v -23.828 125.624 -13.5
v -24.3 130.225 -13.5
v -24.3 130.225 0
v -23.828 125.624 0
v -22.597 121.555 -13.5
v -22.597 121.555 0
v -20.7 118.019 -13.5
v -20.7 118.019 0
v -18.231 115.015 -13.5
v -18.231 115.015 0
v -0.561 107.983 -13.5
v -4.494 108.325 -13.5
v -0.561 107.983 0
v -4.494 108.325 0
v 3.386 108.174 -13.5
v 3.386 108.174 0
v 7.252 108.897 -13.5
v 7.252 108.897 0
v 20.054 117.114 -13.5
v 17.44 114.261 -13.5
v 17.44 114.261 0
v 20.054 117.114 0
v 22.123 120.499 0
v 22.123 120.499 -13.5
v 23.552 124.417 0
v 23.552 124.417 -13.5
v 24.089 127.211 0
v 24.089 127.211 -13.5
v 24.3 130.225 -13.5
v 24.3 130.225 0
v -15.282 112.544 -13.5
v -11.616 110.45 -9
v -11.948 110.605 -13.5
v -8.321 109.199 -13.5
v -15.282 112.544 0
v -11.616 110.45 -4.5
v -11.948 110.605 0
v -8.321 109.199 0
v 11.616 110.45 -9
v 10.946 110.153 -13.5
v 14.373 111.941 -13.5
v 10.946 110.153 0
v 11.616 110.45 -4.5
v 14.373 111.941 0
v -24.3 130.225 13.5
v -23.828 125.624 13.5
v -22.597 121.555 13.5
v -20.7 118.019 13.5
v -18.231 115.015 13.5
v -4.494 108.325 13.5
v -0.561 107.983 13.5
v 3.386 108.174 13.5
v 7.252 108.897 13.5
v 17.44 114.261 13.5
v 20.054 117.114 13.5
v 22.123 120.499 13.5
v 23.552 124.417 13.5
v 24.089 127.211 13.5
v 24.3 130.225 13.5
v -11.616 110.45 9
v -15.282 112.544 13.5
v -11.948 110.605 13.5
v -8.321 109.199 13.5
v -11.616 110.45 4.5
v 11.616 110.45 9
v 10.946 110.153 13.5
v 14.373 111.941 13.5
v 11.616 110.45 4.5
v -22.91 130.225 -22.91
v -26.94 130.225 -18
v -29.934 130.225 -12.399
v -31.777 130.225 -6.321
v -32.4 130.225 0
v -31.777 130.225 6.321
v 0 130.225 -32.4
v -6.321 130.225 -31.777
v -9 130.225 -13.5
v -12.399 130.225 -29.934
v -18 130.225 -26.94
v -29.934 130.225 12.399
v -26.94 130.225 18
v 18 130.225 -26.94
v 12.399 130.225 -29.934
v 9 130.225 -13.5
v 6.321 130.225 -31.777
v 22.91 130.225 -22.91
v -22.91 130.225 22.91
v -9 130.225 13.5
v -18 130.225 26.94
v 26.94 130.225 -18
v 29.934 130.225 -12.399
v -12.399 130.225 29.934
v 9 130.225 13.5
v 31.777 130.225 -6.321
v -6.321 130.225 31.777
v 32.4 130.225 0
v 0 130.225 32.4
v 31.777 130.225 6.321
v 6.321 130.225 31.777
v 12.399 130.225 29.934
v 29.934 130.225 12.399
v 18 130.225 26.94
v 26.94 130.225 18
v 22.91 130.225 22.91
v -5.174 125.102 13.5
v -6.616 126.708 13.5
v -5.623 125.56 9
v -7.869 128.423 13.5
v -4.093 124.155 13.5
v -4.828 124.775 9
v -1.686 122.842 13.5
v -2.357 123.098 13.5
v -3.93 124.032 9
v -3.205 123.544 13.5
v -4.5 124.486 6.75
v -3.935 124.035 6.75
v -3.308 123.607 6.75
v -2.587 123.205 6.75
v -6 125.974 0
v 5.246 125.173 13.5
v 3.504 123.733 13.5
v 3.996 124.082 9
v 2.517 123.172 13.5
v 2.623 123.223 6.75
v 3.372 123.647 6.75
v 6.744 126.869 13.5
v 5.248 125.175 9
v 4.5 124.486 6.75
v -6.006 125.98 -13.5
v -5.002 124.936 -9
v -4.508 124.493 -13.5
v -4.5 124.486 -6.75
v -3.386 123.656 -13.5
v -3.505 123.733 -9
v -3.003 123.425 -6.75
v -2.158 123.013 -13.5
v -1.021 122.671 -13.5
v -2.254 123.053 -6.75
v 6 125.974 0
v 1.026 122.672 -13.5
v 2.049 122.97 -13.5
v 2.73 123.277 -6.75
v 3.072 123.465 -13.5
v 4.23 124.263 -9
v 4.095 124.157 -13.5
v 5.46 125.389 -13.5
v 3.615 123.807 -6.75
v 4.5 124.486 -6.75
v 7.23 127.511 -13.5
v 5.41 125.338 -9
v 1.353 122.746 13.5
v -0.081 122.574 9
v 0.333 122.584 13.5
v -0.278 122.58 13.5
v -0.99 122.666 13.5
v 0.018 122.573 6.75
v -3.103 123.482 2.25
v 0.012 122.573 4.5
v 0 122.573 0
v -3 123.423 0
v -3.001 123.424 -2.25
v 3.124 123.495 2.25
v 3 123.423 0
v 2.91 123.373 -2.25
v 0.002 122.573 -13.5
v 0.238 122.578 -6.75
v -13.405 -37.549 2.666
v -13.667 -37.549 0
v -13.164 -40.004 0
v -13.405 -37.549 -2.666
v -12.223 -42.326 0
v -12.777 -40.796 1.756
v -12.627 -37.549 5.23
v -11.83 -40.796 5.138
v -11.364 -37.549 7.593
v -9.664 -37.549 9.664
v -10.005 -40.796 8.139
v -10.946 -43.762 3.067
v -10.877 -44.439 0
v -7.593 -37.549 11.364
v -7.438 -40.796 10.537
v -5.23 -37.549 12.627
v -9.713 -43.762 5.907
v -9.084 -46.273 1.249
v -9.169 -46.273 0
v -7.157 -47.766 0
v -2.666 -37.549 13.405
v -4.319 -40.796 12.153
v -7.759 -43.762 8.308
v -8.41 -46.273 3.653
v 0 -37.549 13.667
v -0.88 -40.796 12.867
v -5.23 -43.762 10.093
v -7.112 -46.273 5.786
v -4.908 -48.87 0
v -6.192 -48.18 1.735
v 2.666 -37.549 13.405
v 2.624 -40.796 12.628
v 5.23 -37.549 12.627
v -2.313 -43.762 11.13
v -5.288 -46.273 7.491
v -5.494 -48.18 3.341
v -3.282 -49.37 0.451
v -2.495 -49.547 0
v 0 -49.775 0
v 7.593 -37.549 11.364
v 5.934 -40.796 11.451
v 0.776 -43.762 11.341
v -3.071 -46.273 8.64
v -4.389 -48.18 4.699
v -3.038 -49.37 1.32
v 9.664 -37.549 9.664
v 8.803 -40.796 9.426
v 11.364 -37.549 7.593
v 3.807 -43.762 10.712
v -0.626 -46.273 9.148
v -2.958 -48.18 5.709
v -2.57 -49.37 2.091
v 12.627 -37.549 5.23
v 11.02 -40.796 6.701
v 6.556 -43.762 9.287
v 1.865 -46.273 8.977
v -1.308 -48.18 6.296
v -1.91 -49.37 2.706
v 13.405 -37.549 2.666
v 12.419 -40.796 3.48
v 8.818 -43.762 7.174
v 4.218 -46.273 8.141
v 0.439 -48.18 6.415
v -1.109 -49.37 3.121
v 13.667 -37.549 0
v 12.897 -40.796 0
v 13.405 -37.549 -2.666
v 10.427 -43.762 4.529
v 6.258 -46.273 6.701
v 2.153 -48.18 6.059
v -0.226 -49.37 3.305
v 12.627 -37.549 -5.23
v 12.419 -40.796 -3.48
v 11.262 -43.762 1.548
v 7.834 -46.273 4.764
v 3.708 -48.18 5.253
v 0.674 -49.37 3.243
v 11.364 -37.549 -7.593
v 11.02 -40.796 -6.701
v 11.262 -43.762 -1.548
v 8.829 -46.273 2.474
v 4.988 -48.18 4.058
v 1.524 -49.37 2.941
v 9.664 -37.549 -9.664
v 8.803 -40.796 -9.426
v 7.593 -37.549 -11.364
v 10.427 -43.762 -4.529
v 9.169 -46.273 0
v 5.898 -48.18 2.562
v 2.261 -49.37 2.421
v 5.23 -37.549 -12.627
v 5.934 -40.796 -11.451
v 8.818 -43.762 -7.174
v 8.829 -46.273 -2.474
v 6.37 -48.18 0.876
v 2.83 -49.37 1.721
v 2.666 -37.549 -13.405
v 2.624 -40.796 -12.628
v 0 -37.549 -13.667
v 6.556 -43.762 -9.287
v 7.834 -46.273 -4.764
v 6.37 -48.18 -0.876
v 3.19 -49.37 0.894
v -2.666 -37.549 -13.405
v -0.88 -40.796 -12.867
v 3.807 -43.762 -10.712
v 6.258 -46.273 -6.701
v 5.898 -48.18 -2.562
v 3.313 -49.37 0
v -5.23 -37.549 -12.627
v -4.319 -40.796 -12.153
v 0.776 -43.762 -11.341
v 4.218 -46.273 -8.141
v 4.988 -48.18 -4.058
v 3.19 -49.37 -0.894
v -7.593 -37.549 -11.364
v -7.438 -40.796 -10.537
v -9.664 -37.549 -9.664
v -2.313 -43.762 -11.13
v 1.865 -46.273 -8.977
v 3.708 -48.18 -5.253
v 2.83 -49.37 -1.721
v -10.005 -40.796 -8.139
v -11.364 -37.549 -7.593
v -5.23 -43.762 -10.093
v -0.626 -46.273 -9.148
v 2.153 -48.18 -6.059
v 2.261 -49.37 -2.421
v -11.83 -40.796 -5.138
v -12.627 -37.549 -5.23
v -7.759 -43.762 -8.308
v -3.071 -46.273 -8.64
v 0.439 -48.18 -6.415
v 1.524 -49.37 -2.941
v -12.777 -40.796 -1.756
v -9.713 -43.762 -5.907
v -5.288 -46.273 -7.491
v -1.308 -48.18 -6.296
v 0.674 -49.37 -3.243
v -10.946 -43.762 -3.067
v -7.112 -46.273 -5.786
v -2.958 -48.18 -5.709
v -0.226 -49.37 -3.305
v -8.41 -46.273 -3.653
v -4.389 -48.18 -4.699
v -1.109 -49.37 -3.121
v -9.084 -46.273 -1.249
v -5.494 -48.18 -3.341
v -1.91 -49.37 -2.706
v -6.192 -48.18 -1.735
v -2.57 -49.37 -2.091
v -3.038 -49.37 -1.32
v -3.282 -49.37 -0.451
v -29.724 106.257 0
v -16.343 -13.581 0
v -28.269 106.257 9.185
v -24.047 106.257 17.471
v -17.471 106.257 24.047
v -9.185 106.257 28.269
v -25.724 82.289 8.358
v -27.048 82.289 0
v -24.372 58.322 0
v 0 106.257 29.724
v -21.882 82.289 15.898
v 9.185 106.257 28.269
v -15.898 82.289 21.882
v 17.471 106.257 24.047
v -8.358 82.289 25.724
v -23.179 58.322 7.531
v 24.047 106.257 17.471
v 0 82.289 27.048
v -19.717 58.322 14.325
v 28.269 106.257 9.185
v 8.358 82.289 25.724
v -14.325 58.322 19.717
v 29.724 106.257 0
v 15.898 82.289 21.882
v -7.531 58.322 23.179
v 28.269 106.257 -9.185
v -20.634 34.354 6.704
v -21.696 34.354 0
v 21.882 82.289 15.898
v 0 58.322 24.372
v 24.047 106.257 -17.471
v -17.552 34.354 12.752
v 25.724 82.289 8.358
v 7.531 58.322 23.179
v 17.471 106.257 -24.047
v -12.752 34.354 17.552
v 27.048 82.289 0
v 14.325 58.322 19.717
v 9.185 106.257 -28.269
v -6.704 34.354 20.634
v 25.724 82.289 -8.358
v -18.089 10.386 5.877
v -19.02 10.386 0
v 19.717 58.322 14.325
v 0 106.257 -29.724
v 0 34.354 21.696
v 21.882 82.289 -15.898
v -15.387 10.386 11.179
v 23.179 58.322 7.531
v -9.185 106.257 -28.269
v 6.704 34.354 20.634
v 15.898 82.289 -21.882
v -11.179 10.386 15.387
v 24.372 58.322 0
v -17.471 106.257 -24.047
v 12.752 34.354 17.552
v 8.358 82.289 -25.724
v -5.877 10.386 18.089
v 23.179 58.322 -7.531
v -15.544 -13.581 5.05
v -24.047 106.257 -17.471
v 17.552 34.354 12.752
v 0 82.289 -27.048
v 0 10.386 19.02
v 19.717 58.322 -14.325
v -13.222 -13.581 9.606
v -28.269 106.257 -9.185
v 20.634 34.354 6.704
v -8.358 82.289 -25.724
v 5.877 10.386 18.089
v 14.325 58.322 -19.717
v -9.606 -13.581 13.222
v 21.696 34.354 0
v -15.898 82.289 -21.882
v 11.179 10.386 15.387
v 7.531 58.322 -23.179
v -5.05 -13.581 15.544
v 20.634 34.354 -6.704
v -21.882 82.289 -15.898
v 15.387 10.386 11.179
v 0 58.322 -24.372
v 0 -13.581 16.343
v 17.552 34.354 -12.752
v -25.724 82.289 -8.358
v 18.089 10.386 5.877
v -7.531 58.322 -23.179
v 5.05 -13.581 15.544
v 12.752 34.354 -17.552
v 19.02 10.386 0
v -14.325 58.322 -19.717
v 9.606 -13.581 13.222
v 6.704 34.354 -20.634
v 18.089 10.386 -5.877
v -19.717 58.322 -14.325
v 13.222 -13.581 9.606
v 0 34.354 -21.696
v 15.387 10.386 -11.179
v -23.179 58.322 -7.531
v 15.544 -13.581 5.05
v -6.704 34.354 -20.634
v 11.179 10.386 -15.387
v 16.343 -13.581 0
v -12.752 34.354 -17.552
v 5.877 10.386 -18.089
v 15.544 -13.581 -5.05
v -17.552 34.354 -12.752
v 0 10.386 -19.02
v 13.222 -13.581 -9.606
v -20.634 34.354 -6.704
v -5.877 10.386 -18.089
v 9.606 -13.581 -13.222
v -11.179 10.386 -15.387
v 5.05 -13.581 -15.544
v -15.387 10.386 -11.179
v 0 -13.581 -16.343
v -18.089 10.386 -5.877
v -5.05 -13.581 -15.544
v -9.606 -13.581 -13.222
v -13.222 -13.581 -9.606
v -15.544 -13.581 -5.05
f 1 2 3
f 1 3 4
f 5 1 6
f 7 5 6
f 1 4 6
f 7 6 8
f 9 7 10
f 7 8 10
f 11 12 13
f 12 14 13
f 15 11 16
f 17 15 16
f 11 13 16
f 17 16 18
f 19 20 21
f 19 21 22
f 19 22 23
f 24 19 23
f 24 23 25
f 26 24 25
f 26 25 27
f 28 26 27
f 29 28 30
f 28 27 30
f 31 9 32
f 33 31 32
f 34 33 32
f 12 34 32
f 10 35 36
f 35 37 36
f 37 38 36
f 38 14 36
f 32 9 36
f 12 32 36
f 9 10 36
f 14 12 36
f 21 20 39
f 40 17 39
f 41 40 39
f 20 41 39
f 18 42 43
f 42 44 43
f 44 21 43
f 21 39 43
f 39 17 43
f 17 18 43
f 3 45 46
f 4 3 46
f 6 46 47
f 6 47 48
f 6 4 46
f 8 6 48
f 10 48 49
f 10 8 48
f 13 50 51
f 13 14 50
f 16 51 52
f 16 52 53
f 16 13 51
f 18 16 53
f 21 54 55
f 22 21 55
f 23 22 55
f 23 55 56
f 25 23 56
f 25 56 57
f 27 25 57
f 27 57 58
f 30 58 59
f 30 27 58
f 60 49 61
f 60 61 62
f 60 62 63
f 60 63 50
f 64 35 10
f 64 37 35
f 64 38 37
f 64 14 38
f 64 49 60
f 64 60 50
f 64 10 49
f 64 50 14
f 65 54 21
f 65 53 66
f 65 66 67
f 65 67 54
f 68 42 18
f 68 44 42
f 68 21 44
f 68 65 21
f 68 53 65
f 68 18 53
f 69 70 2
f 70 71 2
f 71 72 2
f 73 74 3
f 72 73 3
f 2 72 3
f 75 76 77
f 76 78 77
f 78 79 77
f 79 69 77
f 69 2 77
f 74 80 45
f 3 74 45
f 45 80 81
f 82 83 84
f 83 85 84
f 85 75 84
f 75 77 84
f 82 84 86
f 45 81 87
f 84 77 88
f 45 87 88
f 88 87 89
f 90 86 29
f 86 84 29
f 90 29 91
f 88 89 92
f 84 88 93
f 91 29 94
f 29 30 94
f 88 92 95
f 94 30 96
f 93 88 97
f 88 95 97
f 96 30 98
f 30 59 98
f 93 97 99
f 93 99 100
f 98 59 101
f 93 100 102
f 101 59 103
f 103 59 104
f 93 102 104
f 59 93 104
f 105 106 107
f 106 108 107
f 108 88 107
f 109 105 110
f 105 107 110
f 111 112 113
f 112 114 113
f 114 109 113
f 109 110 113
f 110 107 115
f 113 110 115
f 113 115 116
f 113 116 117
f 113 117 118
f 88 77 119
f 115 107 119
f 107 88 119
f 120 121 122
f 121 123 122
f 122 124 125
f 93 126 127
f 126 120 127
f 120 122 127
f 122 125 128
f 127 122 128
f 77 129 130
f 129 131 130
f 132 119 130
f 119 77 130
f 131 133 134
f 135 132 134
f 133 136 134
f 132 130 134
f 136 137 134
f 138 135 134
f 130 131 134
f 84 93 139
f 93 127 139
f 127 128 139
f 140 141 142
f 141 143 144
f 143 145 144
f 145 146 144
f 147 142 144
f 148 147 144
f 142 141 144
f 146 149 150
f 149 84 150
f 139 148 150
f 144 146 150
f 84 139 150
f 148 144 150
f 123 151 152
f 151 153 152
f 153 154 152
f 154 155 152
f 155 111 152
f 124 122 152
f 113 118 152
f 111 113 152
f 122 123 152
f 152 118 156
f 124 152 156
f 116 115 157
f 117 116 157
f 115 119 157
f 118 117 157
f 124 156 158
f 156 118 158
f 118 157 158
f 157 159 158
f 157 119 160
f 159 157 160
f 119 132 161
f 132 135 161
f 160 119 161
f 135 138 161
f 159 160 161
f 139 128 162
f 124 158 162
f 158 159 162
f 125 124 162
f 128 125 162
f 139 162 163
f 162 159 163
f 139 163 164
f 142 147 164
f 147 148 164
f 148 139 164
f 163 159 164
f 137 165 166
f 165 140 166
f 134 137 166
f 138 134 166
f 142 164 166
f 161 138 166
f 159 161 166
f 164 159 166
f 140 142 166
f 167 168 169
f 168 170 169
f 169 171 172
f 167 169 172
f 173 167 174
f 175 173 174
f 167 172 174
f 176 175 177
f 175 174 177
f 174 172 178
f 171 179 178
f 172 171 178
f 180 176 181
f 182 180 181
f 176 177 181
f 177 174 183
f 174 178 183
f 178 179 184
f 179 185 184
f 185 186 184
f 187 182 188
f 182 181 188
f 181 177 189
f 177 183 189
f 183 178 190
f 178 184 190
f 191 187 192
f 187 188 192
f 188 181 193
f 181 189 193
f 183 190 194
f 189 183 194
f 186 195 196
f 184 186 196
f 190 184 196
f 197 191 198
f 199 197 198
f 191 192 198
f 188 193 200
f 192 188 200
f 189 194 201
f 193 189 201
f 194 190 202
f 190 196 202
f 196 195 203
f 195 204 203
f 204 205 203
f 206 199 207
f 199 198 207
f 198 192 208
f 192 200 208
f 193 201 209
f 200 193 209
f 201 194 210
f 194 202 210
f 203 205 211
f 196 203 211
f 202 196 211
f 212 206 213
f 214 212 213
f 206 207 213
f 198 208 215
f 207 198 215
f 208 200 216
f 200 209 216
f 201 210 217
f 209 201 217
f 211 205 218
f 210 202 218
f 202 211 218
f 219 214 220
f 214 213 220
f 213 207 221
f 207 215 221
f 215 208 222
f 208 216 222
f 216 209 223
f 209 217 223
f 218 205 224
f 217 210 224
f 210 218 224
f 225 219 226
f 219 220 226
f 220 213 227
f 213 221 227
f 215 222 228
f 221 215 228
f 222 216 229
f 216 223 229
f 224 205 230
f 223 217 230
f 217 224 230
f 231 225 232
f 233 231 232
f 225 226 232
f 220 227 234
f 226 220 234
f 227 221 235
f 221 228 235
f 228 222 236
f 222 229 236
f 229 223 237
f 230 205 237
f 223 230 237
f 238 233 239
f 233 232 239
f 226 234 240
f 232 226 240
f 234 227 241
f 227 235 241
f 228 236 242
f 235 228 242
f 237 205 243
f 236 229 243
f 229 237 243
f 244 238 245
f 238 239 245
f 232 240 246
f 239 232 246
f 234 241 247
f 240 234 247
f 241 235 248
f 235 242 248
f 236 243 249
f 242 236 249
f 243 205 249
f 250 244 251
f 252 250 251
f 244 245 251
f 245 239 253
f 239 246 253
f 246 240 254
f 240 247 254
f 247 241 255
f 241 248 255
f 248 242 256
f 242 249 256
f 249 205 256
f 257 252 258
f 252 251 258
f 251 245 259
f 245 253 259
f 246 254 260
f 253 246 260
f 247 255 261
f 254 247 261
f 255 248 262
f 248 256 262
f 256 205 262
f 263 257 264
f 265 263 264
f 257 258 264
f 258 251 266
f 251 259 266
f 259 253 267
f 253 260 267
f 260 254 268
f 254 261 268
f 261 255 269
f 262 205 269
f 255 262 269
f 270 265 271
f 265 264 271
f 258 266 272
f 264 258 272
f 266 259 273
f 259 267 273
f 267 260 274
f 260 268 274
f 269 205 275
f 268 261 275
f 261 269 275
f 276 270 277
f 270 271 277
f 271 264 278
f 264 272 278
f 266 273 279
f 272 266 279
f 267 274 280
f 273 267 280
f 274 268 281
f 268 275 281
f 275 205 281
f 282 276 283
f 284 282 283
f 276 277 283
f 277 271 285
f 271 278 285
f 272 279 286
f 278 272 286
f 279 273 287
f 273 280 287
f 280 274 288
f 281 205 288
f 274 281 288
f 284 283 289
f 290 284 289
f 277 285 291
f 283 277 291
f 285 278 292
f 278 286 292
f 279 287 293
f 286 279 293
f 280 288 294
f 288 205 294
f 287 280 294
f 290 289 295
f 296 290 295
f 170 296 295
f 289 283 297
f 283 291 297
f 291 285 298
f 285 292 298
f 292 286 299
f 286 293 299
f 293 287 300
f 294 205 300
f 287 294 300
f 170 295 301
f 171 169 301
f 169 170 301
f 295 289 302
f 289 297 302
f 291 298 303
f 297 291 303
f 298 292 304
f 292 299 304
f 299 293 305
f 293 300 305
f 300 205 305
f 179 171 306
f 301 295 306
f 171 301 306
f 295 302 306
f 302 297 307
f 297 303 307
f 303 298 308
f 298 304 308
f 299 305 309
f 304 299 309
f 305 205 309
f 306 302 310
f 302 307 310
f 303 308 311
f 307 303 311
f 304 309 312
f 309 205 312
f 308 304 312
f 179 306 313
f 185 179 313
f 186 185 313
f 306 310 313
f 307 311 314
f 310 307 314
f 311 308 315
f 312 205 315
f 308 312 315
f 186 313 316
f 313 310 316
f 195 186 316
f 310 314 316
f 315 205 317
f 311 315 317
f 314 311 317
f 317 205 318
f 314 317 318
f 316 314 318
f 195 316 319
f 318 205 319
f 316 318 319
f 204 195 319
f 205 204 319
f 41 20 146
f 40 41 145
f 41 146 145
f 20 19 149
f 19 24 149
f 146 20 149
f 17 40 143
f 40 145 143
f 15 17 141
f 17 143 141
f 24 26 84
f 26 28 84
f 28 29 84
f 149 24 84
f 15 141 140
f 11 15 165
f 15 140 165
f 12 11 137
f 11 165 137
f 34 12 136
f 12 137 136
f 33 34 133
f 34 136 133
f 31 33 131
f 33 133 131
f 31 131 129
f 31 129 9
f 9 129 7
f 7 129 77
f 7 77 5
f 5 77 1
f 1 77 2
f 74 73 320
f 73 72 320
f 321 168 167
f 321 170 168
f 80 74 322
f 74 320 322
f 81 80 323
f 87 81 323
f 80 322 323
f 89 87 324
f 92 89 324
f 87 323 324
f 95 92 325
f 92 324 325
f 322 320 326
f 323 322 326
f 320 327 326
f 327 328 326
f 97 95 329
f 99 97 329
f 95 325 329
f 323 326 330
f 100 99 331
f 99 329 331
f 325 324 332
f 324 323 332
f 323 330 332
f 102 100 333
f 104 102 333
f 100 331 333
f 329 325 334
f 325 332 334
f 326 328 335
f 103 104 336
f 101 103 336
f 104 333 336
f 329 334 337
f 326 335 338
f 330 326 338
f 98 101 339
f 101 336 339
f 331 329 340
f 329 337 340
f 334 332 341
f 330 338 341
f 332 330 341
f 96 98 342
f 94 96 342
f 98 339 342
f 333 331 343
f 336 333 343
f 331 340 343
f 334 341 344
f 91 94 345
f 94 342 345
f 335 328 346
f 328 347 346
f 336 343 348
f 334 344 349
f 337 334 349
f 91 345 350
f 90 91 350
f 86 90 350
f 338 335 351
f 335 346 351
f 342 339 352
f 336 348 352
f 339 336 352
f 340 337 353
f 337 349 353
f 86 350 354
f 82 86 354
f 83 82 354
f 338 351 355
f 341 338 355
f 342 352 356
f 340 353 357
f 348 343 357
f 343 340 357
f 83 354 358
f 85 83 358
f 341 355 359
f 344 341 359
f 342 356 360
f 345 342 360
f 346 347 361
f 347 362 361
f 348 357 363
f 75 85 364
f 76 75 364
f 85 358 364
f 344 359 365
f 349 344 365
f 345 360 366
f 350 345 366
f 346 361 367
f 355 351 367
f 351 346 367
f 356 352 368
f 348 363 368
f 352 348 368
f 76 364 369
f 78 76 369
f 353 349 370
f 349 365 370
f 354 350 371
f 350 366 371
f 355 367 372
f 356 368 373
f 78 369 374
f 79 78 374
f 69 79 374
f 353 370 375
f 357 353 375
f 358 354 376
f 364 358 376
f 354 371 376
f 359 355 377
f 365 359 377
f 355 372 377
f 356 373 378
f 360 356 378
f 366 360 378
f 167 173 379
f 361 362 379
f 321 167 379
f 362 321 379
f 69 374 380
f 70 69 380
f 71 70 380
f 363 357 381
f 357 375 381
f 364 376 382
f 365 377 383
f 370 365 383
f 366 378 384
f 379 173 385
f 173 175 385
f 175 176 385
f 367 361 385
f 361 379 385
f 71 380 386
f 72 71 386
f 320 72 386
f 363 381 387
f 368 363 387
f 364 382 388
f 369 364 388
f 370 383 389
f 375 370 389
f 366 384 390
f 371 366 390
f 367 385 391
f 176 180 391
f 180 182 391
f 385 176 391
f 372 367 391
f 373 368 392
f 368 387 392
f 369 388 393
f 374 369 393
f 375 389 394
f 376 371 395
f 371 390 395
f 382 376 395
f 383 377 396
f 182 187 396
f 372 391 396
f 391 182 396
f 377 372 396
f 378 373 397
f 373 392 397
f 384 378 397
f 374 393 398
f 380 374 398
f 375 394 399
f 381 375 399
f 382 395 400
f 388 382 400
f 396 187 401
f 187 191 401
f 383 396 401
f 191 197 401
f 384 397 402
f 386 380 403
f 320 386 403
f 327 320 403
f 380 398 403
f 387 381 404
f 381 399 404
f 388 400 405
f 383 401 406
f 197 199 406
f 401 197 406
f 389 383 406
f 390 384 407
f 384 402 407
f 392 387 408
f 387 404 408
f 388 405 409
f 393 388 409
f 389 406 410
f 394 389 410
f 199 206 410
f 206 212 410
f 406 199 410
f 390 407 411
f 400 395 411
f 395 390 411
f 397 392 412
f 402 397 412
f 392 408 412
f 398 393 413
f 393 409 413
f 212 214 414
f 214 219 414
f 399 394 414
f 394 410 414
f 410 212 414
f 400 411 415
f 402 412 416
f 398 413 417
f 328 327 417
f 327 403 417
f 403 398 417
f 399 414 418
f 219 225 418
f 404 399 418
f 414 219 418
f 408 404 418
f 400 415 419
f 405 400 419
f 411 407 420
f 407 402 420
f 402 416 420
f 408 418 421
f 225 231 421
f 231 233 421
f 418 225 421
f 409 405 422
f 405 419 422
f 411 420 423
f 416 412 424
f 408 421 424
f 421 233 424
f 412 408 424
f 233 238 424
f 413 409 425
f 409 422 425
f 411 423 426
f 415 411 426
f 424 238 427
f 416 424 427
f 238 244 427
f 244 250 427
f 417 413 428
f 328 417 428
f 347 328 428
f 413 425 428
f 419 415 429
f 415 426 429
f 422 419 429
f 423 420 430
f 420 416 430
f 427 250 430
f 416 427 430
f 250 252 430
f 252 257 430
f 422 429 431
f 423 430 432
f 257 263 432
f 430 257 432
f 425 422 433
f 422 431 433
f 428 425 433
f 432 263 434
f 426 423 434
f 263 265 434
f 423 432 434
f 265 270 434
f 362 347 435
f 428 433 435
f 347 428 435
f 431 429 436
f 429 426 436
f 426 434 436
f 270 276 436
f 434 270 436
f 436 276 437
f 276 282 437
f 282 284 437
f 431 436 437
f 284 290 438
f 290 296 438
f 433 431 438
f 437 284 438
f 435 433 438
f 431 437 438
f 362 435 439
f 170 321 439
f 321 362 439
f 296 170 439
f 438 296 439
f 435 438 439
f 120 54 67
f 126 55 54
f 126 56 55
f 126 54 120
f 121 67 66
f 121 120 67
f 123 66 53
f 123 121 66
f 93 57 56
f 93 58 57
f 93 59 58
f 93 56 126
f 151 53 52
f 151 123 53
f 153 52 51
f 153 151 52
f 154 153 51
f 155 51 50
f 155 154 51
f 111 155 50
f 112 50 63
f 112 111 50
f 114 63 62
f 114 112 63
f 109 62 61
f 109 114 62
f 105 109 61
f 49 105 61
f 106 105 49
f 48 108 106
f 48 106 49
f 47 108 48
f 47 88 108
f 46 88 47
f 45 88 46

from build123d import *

# Parameters (mm, degrees)
ENL_V_MAT_EXTRU_1_DEPTH      = 7.5
ENL_V_MAT_EXTRU_1_DEPTH_BACK = 7.5
BOSS_EXTRU_1_REACH           = 27.5
ECHELLE1_SCALE               = 1.8


with BuildPart() as part:
    # Esquisse1 → R_volution1 (revolve)
    with BuildSketch(Plane.XY):
        with BuildLine():
            Line((0, 0), (0, 100))
            Line((0, 100), (-18, 100))
            Line((-18, 100), (-7.593007693, 6.792401612))
            ThreePointArc((-7.593007693, 6.792401612), (-5.093880777, 1.945904787), (0, 0))
        make_face()
    revolve(axis=Axis((0, 0, 0), (0, 1, 0)))

    # Esquisse2 → Enl_v. mat.-Extru.1 (cut, two sides)
    with BuildSketch(Plane.XY) as enl_v_mat_extru_1_sk:
        with BuildLine():
            Line((-13.5, 100), (13.5, 100))
            add(Edge.make_bspline(
                [(-13.5, 100), (-13.291113541, 83.520875666), (13.291113541, 83.520875666), (13.5, 100)],
                knots=[0, 0, 0, 0, 1, 1, 1, 1], degree=3))
        make_face()
    extrude(amount=ENL_V_MAT_EXTRU_1_DEPTH, mode=Mode.SUBTRACT)
    extrude(enl_v_mat_extru_1_sk.sketch, amount=-ENL_V_MAT_EXTRU_1_DEPTH_BACK, mode=Mode.SUBTRACT)

    # Esquisse3 → Boss.-Extru.1 (add, up to next)
    with BuildSketch(Plane.XY.offset(-7.5), mode=Mode.PRIVATE) as boss_extru_1_sk1:
        with BuildLine():
            Line((-5, 100), (5, 100))
            add(Edge.make_bspline(
                [(-5, 100), (0, 91.498247822), (5, 100)],
                knots=[0, 0, 0, 1, 1, 1], degree=2))
        make_face()
    boss_extru_1_tool1 = extrude(boss_extru_1_sk1.sketch, amount=BOSS_EXTRU_1_REACH, mode=Mode.PRIVATE) - part.part
    add(boss_extru_1_tool1.solids().sort_by_distance((0, 98.29965, -7.5))[0])


with BuildPart() as part_1:
    # Echelle1: scaled about (-4e-09, 62.219241992, 3e-09)
    add(part.part.scale(ECHELLE1_SCALE).moved(Location((3e-09, -49.775393594, -2e-09))))


solid = part_1.part
